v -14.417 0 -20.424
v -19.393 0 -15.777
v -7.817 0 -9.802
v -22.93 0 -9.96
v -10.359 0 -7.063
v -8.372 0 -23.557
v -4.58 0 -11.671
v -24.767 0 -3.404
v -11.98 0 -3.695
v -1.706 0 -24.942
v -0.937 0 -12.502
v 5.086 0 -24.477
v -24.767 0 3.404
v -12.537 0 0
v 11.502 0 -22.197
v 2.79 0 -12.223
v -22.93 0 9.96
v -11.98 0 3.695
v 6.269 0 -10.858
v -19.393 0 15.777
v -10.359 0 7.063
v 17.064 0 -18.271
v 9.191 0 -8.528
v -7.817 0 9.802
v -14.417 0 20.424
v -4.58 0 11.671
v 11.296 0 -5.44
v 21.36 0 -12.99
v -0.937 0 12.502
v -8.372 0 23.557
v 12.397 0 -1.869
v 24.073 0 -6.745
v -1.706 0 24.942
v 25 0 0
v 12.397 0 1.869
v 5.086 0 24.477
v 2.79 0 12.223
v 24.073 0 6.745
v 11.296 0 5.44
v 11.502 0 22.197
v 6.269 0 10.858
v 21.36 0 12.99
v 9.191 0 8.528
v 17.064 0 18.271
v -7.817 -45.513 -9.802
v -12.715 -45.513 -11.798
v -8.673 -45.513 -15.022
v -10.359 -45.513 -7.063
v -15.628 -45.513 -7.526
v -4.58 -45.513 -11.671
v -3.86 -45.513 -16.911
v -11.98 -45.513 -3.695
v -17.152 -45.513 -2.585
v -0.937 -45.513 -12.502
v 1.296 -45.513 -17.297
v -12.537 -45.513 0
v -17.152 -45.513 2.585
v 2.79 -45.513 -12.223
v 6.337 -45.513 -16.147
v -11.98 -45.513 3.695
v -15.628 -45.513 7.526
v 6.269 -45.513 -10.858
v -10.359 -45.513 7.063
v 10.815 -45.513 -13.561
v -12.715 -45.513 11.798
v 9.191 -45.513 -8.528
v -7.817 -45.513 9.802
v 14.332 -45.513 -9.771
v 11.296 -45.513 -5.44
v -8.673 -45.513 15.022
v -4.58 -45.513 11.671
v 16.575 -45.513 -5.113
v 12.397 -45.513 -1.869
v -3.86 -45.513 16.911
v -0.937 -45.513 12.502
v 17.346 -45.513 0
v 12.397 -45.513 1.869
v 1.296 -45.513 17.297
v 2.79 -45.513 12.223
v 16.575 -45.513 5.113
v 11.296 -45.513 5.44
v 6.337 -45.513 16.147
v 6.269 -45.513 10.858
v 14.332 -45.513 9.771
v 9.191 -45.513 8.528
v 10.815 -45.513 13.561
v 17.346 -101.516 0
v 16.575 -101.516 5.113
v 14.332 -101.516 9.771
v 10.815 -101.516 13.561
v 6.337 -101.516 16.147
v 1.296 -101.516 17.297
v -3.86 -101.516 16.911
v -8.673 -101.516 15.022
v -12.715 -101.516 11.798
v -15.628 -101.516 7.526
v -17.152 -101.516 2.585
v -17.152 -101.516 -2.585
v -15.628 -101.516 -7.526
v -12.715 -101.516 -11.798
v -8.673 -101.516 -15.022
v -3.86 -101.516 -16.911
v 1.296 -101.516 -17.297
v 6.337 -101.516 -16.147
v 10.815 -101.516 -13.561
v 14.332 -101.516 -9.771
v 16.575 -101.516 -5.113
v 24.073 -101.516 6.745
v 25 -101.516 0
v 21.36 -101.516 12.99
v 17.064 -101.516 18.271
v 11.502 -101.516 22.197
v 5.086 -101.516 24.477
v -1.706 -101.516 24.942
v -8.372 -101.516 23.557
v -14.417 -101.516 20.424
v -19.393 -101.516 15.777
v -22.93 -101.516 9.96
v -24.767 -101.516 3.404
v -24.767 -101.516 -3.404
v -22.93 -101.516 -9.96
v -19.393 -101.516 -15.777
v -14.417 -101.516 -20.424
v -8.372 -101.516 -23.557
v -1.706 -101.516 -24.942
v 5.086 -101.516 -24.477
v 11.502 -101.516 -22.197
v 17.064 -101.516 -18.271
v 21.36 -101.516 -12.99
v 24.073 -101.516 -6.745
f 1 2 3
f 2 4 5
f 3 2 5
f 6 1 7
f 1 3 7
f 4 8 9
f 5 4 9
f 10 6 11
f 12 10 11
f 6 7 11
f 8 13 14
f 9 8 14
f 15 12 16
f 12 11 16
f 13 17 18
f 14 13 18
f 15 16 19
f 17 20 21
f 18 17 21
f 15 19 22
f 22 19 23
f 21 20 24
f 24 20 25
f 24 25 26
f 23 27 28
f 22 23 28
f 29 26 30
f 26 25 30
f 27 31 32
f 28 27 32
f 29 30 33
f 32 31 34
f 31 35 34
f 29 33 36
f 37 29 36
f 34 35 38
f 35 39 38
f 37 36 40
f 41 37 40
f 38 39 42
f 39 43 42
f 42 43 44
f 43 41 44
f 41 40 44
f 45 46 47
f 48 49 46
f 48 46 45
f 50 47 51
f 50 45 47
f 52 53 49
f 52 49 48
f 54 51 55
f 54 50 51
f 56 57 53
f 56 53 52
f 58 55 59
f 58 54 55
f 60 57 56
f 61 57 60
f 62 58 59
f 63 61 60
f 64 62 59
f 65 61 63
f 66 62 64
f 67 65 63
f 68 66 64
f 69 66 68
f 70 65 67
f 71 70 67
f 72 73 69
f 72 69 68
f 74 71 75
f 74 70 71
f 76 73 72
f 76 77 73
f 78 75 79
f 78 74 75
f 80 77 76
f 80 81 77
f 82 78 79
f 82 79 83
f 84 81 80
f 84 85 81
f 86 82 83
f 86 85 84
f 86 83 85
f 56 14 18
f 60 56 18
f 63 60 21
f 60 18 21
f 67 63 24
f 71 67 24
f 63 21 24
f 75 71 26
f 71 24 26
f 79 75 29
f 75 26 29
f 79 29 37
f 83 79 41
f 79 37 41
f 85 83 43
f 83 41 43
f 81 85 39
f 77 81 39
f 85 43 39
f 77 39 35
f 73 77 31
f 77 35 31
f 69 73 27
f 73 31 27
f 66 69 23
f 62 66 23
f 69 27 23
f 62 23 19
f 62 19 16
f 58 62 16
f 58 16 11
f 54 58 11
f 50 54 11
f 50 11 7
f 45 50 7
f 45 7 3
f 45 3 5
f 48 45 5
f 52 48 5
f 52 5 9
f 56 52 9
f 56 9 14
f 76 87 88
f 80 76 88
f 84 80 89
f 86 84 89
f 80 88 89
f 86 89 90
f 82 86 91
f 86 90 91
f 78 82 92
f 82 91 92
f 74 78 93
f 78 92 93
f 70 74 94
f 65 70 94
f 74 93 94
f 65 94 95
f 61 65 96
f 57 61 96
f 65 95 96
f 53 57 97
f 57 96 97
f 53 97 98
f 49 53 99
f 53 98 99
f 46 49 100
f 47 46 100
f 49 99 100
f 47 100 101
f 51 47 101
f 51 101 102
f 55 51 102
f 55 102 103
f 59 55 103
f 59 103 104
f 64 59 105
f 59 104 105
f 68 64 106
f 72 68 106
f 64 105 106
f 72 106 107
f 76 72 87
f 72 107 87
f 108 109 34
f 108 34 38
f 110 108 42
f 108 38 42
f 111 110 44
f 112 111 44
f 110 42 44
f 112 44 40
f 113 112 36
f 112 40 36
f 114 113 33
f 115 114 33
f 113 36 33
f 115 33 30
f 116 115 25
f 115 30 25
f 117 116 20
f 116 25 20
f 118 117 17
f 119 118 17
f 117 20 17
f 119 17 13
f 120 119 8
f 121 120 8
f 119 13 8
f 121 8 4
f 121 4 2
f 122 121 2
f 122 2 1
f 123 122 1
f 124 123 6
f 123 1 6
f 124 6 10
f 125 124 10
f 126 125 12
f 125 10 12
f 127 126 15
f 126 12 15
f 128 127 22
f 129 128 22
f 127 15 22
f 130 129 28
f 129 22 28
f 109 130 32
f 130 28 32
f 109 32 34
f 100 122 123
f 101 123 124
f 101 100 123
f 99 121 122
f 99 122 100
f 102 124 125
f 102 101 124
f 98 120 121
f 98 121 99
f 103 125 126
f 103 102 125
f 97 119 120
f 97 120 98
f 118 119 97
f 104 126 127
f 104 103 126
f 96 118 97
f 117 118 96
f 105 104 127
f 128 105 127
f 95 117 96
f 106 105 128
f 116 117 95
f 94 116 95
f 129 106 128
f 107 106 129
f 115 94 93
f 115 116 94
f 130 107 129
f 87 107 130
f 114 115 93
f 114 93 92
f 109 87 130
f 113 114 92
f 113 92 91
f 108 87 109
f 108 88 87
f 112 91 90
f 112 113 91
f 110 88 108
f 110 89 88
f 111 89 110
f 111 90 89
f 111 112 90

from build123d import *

# Parameters (mm, degrees)
F0_R     = 25
F1_DEPTH = 101.516215
F2_R     = 12.537375
F3_DEPTH = 50.175298
F4_R     = 17.345537
F5_DEPTH = 56.003423


with BuildPart() as f1:
    # F0 (on Front) → F1 (new body)
    with BuildSketch(Plane.XZ):
        Circle(F0_R)
    extrude(amount=F1_DEPTH)

    # F2 (on face) → F3 (cut)
    with BuildSketch(Plane(origin=(0, 0, 0), x_dir=(-1, 0, 0), z_dir=(0, 1, 0))):
        Circle(F2_R)
    extrude(amount=-F3_DEPTH, mode=Mode.SUBTRACT)

    # F4 (on face) → F5 (cut)
    with BuildSketch(Plane.XZ.offset(101.516215)):
        Circle(F4_R)
    extrude(amount=-F5_DEPTH, mode=Mode.SUBTRACT)


solid = f1.part
